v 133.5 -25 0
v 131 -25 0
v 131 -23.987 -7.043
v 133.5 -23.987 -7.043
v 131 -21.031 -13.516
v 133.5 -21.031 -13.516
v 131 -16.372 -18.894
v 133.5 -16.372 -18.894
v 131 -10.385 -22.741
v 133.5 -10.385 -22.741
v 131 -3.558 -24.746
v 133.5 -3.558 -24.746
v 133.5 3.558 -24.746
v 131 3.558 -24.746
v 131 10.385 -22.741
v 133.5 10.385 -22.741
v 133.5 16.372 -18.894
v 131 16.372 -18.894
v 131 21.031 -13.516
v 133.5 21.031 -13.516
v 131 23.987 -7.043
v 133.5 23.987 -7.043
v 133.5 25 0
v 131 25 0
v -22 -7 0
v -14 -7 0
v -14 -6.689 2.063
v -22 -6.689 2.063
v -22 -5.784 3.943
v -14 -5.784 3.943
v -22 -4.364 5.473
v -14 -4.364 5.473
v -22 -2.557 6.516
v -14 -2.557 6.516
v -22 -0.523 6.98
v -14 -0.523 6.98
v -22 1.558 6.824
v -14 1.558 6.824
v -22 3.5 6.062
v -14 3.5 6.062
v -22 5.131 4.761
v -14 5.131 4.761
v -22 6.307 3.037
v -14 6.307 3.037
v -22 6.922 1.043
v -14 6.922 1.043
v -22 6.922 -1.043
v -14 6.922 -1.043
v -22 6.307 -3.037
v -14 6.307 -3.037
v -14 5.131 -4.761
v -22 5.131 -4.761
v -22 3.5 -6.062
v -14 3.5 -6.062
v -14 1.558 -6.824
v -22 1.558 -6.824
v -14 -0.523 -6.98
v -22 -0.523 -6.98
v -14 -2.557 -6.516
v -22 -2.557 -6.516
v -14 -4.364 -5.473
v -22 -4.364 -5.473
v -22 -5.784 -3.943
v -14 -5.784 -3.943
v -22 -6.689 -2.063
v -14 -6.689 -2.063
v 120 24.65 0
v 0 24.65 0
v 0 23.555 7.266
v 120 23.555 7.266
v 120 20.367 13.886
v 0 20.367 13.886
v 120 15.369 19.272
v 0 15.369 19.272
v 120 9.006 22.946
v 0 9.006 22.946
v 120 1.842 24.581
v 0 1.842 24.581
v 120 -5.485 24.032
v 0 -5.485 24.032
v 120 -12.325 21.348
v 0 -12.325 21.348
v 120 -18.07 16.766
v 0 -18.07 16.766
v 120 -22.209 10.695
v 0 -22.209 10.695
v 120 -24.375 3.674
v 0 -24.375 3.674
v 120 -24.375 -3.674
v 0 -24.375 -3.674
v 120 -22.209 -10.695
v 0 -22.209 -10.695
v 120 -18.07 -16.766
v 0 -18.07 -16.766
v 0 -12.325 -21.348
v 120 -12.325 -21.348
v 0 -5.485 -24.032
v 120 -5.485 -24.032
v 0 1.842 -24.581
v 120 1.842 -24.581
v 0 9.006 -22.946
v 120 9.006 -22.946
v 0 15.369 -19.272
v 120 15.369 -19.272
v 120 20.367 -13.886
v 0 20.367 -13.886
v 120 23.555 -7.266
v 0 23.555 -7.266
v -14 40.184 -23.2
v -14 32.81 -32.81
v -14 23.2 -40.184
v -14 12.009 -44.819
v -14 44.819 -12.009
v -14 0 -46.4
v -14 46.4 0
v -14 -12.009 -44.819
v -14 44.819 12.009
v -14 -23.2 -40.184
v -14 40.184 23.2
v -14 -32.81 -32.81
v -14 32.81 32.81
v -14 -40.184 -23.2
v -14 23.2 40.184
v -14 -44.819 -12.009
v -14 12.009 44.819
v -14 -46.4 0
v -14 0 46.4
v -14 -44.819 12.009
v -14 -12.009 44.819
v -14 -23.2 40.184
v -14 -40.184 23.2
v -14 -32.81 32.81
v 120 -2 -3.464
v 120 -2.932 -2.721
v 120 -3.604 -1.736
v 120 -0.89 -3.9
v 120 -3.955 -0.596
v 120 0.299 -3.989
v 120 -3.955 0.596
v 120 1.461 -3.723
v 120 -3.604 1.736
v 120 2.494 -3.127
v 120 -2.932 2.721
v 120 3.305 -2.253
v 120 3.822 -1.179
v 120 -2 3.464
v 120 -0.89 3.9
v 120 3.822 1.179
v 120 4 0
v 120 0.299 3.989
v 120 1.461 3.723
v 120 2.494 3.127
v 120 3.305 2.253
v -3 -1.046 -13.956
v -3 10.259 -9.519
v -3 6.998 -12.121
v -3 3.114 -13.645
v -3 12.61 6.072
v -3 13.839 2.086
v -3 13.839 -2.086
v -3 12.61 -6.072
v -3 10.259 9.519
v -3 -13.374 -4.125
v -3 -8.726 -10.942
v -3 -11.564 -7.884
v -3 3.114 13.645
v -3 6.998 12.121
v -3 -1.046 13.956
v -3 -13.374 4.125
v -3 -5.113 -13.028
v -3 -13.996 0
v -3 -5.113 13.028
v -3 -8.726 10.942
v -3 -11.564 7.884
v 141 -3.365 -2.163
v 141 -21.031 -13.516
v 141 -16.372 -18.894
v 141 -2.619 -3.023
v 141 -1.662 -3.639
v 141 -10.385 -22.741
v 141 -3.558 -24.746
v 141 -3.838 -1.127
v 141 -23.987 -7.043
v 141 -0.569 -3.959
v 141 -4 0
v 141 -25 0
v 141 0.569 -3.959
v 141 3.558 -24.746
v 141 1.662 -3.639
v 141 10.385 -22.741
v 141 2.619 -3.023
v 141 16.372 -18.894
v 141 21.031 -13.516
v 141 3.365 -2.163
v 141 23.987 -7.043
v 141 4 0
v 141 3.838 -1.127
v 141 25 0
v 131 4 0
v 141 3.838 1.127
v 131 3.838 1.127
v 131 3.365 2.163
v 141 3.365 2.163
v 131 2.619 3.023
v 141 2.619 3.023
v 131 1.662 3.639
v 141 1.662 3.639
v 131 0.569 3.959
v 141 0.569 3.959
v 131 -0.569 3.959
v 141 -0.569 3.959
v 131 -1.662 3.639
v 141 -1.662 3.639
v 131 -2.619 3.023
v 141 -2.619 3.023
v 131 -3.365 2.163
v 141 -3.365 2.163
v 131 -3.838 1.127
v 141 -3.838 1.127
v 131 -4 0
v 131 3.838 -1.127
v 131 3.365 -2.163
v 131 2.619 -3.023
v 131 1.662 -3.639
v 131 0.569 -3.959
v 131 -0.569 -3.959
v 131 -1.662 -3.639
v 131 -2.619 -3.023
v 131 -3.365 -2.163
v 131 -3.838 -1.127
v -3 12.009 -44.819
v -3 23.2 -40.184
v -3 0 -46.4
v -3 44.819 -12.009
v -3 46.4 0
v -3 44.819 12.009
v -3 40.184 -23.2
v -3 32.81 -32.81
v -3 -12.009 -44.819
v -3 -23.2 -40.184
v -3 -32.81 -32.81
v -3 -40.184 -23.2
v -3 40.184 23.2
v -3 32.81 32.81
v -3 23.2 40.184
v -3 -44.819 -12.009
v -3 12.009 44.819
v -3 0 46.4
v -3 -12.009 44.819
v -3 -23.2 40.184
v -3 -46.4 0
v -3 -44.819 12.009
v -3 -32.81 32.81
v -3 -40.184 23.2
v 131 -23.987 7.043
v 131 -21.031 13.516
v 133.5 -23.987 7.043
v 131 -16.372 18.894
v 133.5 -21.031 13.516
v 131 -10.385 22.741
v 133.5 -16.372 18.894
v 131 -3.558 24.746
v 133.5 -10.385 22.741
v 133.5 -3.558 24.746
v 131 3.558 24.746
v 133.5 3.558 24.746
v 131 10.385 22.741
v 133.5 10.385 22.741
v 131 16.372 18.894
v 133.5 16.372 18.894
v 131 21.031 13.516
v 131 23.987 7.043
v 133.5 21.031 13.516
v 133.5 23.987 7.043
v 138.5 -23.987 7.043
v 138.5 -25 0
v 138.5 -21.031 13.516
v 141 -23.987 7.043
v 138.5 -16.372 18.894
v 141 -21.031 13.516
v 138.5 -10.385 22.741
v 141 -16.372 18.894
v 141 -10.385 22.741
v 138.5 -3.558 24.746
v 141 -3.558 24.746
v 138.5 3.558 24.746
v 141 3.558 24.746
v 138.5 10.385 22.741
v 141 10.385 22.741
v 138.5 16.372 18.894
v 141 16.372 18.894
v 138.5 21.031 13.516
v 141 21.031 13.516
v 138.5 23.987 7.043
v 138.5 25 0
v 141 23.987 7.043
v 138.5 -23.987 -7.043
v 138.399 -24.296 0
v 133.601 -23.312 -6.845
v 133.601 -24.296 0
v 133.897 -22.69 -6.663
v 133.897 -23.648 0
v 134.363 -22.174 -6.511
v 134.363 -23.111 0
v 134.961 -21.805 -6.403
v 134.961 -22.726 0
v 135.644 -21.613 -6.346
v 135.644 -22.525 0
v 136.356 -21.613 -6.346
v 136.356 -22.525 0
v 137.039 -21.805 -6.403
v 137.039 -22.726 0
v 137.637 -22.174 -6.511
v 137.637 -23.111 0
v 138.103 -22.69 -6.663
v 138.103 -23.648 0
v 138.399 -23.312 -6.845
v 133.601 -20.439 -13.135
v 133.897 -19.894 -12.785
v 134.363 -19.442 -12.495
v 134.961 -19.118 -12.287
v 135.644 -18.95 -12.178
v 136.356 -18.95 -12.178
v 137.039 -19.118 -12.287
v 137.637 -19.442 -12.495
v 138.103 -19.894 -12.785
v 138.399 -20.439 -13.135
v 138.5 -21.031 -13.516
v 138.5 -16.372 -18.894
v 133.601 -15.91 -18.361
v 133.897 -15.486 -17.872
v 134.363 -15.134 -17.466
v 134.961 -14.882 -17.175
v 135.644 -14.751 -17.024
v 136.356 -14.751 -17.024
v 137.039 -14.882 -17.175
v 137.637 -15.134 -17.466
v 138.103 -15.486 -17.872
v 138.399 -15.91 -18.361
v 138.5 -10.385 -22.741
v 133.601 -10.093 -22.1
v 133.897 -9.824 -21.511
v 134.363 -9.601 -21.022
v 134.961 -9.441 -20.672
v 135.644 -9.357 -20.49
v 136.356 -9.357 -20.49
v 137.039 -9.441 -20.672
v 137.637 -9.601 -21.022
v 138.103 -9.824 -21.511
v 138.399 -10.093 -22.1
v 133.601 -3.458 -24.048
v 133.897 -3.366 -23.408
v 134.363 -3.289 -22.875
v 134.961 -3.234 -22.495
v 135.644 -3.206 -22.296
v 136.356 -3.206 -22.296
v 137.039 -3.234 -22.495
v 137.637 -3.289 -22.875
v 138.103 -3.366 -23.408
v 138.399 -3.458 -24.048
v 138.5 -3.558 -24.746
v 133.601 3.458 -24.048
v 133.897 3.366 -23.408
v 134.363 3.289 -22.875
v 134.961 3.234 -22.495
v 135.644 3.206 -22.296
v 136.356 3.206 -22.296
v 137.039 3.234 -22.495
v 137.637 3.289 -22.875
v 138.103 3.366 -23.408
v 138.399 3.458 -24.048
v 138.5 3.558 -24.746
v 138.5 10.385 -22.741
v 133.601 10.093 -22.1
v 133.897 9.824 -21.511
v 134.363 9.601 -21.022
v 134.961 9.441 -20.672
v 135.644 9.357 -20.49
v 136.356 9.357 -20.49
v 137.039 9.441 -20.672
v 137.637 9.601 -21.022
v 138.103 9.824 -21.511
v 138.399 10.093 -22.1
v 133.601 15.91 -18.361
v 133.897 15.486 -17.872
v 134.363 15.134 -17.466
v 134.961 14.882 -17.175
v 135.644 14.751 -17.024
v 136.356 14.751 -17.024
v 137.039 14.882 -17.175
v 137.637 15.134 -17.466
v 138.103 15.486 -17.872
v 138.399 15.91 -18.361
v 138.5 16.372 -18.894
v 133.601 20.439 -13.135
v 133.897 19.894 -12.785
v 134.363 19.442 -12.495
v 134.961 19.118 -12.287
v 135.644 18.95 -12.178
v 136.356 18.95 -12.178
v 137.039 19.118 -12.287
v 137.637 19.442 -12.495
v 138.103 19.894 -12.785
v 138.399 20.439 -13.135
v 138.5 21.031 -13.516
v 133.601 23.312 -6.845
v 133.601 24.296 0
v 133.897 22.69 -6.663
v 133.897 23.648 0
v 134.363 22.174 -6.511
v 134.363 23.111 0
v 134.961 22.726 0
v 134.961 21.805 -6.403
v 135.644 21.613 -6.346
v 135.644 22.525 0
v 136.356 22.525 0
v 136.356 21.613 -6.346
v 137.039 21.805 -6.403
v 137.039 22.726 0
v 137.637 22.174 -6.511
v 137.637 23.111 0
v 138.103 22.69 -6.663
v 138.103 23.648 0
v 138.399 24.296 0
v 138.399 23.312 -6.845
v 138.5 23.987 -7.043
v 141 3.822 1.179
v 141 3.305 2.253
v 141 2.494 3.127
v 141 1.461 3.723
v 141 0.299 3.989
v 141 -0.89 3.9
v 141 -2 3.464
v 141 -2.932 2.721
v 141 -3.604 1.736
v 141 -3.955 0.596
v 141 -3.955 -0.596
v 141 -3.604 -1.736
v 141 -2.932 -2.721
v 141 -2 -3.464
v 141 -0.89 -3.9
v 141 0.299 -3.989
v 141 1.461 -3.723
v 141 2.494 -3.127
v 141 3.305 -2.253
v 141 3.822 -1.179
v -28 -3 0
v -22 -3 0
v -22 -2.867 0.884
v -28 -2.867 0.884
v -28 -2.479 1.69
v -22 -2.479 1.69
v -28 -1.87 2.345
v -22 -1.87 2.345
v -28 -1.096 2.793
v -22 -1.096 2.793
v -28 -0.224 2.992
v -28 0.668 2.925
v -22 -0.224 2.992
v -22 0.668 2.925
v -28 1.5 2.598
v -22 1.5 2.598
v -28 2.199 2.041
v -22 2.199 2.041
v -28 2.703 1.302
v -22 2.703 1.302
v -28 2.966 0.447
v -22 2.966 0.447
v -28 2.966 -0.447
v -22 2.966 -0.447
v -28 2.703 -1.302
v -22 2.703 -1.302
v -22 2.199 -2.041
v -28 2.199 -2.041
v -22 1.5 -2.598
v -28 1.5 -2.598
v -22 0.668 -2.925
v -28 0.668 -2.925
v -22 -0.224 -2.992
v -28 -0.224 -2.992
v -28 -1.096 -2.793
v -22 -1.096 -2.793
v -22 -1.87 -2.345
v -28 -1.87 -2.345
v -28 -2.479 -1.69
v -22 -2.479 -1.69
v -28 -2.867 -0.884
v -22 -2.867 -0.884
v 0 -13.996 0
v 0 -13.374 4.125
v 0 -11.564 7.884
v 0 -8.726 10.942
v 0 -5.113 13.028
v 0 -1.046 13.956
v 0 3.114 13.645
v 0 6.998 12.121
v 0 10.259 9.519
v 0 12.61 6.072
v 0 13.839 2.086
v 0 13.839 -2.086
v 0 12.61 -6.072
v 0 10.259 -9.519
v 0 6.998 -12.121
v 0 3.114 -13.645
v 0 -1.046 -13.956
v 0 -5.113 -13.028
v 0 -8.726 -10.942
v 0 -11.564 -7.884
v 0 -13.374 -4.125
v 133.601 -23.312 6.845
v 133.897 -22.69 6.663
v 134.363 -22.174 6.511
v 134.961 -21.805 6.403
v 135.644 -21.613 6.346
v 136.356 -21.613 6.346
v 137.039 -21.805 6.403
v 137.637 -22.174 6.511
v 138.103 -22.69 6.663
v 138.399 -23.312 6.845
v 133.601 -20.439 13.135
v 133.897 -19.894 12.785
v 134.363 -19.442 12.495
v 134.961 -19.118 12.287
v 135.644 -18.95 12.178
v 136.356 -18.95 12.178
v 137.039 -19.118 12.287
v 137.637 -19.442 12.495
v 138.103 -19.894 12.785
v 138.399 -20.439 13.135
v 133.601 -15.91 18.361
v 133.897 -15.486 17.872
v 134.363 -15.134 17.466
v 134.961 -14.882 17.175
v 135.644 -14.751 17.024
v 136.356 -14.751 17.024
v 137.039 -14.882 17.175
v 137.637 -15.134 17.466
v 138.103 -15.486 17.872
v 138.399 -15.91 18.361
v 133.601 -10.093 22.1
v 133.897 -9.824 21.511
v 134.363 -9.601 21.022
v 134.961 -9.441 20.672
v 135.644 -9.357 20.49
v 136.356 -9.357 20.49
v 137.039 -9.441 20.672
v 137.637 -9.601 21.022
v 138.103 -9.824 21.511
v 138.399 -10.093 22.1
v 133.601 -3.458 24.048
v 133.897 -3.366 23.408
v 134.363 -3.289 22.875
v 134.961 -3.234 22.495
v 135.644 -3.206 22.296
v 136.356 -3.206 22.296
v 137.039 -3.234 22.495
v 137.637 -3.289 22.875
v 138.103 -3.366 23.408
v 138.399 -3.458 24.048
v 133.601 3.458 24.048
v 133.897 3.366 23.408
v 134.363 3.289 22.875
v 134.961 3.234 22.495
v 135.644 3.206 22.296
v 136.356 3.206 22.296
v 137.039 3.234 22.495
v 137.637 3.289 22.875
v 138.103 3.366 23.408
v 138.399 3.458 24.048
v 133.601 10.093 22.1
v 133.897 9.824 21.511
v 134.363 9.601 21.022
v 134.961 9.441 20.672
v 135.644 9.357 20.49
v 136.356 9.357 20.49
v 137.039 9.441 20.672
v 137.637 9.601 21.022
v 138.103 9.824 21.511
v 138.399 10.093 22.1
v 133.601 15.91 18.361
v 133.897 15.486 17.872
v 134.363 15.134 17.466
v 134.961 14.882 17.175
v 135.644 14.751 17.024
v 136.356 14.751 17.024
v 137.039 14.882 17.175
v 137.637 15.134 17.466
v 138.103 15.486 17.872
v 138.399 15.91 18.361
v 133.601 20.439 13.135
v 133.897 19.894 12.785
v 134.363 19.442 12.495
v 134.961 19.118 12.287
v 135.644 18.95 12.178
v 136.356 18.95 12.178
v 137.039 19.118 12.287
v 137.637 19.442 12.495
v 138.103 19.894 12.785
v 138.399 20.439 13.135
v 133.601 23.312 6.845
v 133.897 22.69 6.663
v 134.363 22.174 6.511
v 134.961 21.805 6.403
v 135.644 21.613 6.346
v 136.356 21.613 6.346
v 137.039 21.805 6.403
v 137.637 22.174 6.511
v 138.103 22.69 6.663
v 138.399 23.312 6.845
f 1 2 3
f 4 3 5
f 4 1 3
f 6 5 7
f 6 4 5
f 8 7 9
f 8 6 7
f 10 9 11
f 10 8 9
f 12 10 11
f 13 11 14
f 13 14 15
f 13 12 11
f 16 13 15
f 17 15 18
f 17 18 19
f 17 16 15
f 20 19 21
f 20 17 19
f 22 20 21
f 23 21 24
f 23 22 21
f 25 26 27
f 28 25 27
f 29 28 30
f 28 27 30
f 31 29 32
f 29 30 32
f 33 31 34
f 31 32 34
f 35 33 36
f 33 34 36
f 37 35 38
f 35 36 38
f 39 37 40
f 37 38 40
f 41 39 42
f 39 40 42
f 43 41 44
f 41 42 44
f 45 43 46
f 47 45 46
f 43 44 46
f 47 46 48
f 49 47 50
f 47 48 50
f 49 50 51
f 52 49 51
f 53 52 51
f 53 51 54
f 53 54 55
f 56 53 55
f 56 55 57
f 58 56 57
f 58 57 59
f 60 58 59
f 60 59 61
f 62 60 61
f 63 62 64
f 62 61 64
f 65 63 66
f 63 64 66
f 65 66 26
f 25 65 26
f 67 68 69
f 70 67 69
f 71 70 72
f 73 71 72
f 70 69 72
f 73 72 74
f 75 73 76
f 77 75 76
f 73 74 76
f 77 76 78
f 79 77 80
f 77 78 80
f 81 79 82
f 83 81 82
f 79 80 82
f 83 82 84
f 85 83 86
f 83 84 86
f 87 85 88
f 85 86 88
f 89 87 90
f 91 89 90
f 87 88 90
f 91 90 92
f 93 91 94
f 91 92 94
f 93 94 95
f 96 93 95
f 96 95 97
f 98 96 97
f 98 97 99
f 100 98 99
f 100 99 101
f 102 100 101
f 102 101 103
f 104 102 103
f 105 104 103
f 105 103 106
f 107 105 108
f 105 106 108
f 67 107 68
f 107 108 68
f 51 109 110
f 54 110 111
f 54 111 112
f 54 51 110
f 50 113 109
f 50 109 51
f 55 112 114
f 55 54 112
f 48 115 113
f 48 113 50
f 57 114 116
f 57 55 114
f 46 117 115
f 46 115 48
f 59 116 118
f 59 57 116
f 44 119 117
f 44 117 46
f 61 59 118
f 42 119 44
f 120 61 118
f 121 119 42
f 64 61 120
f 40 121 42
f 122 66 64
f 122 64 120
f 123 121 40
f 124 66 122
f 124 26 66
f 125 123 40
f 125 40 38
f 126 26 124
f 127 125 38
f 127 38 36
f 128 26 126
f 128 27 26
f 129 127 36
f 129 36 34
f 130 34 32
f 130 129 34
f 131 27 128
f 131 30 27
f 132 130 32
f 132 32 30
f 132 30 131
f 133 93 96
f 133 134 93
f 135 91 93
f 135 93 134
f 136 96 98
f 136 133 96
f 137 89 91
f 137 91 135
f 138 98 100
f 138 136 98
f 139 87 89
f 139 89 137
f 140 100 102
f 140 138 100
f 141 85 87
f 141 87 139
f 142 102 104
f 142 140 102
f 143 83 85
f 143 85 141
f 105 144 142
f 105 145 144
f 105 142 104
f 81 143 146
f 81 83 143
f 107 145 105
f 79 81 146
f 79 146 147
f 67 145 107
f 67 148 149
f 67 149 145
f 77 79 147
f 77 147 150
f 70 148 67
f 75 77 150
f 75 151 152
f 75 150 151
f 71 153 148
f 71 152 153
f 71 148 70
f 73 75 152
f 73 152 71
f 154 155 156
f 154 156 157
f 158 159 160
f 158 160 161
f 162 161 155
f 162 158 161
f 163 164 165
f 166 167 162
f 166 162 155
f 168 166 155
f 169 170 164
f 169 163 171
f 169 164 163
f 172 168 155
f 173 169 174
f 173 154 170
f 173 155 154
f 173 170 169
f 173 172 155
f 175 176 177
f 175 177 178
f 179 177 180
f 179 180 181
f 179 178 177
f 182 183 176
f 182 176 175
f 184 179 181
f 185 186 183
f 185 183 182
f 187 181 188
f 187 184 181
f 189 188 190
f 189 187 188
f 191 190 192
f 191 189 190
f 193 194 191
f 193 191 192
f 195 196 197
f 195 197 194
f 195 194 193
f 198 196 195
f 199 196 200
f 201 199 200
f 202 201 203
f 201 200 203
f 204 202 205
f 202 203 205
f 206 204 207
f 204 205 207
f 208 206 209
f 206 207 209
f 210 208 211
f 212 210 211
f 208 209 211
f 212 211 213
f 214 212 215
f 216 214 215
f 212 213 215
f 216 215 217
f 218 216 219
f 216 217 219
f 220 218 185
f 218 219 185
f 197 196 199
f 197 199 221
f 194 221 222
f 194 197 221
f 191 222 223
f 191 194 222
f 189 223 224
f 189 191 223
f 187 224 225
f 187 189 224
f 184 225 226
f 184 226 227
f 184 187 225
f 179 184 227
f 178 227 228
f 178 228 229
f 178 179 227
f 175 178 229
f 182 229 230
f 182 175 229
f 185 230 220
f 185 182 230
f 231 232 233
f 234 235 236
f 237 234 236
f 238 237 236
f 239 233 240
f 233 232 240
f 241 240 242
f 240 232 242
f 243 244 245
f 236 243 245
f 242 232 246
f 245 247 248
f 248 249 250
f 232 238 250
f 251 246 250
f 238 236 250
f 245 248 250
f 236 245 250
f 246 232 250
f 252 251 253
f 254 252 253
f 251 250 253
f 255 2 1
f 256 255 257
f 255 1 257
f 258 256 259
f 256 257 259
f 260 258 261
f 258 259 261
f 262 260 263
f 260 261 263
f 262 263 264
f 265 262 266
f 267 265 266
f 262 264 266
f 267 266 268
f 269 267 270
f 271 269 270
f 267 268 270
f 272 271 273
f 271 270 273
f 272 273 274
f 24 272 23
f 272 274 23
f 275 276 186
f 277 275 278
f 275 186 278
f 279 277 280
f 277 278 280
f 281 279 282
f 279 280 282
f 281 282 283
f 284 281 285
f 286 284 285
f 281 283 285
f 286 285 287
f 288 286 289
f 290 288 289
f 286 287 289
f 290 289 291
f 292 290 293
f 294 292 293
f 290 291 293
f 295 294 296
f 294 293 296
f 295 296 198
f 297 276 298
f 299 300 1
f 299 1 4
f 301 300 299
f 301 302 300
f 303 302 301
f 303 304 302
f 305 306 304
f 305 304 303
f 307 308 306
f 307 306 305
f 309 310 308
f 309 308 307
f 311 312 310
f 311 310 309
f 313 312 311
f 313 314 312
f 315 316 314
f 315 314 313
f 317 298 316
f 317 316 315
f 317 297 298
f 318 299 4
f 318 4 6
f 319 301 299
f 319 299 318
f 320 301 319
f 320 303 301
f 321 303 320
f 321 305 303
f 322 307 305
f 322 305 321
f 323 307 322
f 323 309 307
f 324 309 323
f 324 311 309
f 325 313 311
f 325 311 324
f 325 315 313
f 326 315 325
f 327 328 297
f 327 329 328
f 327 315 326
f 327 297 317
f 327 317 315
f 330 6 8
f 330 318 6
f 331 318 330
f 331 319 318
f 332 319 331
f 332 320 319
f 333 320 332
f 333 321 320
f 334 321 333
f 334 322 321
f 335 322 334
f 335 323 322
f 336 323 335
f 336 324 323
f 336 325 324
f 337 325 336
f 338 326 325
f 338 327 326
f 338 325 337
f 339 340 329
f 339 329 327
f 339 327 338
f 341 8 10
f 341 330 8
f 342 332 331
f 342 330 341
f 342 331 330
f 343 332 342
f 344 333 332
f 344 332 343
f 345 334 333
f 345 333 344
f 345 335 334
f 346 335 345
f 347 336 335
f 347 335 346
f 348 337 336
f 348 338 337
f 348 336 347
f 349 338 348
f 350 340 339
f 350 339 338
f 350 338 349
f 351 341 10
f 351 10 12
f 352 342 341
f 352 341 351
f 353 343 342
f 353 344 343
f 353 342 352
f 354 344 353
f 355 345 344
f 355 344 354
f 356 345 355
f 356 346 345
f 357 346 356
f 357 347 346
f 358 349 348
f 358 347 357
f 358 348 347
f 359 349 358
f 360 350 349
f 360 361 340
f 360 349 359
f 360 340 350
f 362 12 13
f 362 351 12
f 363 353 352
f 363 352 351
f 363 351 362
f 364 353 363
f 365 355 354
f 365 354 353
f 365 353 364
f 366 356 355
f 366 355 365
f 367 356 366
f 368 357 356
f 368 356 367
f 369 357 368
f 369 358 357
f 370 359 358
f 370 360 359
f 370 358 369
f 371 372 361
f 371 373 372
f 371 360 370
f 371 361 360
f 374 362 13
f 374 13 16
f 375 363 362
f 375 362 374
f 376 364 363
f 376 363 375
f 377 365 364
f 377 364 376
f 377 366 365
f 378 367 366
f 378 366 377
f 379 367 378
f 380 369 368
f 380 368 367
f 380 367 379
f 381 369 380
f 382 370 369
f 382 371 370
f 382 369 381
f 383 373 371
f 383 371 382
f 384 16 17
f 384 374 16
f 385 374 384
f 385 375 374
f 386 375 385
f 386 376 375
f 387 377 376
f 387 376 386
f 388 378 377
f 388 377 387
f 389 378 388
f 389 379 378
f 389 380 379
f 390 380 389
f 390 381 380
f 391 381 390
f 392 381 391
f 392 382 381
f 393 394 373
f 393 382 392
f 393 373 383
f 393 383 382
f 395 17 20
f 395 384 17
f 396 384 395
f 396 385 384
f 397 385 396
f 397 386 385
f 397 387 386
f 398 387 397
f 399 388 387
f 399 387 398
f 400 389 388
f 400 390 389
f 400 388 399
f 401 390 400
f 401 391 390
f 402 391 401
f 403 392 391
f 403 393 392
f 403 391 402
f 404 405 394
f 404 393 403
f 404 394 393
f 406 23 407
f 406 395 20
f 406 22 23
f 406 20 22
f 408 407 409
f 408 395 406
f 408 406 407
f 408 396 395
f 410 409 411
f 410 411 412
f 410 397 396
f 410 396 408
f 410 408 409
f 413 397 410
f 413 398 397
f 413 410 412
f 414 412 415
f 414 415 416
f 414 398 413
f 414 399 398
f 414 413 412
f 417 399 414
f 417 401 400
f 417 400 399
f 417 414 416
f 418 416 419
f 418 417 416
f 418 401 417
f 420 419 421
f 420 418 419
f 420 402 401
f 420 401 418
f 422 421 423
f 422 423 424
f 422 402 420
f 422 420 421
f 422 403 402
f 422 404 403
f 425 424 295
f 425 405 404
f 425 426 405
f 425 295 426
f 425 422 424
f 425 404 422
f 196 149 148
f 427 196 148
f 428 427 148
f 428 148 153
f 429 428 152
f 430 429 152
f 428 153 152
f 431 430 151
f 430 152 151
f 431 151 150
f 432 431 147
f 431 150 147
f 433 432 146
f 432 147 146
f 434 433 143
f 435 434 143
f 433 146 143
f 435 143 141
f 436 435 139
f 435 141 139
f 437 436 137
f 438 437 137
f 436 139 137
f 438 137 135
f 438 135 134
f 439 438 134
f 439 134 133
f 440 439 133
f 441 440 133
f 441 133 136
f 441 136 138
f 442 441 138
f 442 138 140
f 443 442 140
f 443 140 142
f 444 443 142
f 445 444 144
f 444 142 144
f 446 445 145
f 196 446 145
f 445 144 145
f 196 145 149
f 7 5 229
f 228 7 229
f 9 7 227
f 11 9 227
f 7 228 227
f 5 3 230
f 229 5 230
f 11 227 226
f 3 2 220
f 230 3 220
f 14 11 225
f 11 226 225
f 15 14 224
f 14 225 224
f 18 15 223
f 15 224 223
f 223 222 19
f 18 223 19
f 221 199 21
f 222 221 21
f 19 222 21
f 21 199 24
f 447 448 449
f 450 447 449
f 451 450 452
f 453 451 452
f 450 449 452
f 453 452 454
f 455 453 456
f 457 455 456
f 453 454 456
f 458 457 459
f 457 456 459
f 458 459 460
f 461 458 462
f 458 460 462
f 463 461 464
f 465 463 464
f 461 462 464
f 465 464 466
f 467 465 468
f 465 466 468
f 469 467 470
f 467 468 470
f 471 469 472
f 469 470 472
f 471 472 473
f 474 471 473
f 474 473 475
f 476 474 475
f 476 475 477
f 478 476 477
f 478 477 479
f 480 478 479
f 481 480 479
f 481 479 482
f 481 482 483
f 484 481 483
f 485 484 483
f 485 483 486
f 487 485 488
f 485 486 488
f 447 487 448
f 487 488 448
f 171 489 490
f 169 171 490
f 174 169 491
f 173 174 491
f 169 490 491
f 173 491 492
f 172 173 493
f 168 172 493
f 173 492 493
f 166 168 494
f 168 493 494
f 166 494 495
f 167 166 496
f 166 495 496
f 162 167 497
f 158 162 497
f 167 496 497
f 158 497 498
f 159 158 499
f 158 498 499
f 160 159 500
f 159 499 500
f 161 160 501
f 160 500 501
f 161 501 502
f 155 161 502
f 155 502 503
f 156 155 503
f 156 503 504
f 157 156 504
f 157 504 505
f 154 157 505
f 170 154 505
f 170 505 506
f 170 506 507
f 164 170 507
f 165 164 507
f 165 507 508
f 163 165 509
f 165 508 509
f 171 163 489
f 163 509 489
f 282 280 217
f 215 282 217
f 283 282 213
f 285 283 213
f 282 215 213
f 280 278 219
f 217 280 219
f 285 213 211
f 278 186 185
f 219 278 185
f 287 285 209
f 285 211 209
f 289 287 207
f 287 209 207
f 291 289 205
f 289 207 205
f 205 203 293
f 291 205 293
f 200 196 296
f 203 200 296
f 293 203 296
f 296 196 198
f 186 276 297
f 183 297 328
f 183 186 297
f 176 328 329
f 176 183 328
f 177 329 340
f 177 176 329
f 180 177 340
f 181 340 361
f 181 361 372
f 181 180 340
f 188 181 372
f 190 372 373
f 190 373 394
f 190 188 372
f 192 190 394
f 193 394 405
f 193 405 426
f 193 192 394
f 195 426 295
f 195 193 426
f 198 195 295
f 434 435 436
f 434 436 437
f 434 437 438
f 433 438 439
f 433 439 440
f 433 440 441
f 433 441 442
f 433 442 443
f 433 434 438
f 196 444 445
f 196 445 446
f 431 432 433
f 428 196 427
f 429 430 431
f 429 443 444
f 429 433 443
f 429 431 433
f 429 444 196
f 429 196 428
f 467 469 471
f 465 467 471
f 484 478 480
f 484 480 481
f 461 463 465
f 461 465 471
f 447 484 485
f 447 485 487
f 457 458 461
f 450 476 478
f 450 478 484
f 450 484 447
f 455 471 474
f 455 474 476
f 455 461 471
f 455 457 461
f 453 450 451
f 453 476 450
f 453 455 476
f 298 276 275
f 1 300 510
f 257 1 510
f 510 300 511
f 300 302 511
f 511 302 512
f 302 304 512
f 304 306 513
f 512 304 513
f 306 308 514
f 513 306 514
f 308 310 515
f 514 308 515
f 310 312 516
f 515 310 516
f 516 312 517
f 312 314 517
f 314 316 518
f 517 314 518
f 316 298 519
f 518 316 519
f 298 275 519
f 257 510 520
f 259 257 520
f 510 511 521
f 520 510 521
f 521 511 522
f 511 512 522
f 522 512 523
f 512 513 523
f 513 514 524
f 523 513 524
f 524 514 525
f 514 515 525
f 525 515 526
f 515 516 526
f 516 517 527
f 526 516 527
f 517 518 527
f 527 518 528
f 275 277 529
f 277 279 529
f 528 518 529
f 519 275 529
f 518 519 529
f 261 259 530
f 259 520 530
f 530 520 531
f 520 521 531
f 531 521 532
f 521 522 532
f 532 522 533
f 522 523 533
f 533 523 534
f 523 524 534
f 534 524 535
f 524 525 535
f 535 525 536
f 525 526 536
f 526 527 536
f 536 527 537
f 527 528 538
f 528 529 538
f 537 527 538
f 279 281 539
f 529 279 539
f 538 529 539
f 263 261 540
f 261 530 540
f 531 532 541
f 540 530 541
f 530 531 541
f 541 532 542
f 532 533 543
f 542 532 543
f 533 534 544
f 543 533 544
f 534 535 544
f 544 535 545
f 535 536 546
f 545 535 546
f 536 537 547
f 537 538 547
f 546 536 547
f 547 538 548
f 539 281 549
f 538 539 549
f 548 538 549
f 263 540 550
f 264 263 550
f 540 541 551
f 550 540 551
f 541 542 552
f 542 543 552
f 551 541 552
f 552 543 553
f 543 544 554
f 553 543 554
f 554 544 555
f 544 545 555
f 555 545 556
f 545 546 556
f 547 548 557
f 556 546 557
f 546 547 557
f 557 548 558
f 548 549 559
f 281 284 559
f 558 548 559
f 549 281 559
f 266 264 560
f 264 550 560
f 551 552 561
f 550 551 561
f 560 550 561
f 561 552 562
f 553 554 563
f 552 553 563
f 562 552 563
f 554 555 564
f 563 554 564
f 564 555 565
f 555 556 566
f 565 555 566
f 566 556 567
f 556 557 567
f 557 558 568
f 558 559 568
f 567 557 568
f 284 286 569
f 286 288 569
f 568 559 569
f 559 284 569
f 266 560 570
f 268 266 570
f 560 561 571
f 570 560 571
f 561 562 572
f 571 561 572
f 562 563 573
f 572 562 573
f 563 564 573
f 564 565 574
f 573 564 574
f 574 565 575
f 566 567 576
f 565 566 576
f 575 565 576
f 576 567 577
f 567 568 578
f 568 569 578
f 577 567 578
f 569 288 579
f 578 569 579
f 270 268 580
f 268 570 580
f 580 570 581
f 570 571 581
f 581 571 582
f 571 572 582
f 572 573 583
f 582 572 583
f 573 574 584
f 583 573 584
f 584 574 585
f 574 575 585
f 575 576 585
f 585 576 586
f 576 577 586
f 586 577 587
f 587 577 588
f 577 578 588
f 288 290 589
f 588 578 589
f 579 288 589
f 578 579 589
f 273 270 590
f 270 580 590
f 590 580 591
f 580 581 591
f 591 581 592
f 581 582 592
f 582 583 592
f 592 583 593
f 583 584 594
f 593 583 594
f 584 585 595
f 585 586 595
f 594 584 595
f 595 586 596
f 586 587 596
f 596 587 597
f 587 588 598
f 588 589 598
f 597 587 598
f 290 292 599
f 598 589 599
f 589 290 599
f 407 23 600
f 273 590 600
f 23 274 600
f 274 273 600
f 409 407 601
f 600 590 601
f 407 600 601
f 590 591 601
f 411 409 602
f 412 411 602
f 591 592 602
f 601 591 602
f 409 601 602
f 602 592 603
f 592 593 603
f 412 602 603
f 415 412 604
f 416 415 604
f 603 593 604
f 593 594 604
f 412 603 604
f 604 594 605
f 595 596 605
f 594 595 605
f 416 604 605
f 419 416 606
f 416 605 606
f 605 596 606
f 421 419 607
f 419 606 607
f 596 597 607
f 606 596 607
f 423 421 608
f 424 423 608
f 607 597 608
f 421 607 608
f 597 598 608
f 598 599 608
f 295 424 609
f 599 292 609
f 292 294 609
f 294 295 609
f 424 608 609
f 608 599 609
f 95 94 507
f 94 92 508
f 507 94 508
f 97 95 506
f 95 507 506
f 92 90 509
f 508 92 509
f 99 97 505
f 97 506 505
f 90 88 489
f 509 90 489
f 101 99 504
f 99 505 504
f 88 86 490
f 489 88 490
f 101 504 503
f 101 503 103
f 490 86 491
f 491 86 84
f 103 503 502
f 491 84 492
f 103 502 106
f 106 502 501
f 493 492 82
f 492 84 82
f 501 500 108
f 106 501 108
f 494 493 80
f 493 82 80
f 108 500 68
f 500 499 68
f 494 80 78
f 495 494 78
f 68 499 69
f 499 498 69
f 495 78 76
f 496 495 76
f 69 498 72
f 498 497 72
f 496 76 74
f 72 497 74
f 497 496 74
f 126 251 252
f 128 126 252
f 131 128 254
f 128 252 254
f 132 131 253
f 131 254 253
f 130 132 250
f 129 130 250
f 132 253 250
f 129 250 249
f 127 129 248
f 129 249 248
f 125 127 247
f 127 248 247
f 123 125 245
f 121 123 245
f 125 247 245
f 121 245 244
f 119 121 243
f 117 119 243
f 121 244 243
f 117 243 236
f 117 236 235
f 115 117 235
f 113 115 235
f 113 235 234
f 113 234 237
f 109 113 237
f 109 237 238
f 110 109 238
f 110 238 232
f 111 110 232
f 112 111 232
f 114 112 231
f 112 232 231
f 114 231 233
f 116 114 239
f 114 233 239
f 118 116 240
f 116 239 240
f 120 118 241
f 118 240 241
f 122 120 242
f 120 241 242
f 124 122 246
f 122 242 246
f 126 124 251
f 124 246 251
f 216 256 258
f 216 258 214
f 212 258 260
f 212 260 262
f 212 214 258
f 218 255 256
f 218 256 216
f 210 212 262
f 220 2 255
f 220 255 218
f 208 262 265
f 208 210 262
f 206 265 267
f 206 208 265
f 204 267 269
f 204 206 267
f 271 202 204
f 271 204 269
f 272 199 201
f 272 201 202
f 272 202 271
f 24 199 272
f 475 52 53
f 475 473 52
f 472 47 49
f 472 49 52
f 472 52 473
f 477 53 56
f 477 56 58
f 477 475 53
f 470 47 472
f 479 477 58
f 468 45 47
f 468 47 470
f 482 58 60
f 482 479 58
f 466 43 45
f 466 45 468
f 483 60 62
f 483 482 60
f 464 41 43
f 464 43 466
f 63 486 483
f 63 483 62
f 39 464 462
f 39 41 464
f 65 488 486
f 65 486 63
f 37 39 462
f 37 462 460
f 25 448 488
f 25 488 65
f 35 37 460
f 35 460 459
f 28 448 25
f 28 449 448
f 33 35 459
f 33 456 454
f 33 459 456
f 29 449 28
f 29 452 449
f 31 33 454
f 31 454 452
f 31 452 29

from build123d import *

# Parameters (mm, degrees)
F0_R      = 24.65
F1_DEPTH  = 120
F2_R      = 4
F3_DEPTH  = 21
F4_R      = 13.995558834
F5_DEPTH  = 3
F6_R      = 46.4
F6_R_2    = 13.995558834
F7_DEPTH  = 11
F8_R      = 7
F9_DEPTH  = 8
F10_R     = 3
F11_DEPTH = 6
F13_DEPTH = 10
F15_R     = 2.5


with BuildPart() as f1:
    # F0 (on Right) → F1 (new body)
    with BuildSketch(Plane.YZ):
        Circle(F0_R)
    extrude(amount=F1_DEPTH)

    # F2 (on face) → F3 (join)
    with BuildSketch(Plane.YZ.offset(120)):
        Circle(F2_R)
    extrude(amount=F3_DEPTH)

    # F4 (on face) → F5 (join)
    with BuildSketch(Plane(origin=(0, 0, 0), x_dir=(0, -1, 0), z_dir=(-1, 0, 0))):
        Circle(F4_R)
    extrude(amount=F5_DEPTH)


with BuildPart() as f7:
    # F6 (on face) → F7 (new body)
    with BuildSketch(Plane(origin=(-3, 0, 0), x_dir=(0, -1, 0), z_dir=(-1, 0, 0))):
        Circle(F6_R)
        Circle(F6_R_2, mode=Mode.SUBTRACT)
        Circle(F6_R_2)
    extrude(amount=F7_DEPTH)

    # F8 (on face) → F9 (join)
    with BuildSketch(Plane(origin=(-14, 0, 0), x_dir=(0, -1, 0), z_dir=(-1, 0, 0))):
        Circle(F8_R)
    extrude(amount=F9_DEPTH)

    # F10 (on face) → F11 (join)
    with BuildSketch(Plane(origin=(-22, 0, 0), x_dir=(0, -1, 0), z_dir=(-1, 0, 0))):
        Circle(F10_R)
    extrude(amount=F11_DEPTH)


with BuildPart() as f13:
    # F12 (on face) → F13 (new body)
    with BuildSketch(Plane.YZ.offset(141)):
        with BuildLine():
            ThreePointArc((4, 0), (0, -4), (-4, 0))
            Line((-4, 0), (-25, 0))
            ThreePointArc((-25, 0), (0, -25), (25, 0))
            Line((25, 0), (4, 0))
        make_face()
    extrude(amount=-F13_DEPTH)

    # F15 (on Top) → F16 (revolve, cut)
    with BuildSketch(Plane.XY):
        with Locations((136, 25)):
            Circle(F15_R)
    revolve(axis=Axis((251.4820694923, 0, 0), (1, 0, 0)), mode=Mode.SUBTRACT)

    # F17: F13 across plane


with BuildPart() as f13_1:
    add(f13.part)
    add(f13.part.mirror(Plane.XY))


solid = Compound([f1.part, f7.part, f13_1.part])
